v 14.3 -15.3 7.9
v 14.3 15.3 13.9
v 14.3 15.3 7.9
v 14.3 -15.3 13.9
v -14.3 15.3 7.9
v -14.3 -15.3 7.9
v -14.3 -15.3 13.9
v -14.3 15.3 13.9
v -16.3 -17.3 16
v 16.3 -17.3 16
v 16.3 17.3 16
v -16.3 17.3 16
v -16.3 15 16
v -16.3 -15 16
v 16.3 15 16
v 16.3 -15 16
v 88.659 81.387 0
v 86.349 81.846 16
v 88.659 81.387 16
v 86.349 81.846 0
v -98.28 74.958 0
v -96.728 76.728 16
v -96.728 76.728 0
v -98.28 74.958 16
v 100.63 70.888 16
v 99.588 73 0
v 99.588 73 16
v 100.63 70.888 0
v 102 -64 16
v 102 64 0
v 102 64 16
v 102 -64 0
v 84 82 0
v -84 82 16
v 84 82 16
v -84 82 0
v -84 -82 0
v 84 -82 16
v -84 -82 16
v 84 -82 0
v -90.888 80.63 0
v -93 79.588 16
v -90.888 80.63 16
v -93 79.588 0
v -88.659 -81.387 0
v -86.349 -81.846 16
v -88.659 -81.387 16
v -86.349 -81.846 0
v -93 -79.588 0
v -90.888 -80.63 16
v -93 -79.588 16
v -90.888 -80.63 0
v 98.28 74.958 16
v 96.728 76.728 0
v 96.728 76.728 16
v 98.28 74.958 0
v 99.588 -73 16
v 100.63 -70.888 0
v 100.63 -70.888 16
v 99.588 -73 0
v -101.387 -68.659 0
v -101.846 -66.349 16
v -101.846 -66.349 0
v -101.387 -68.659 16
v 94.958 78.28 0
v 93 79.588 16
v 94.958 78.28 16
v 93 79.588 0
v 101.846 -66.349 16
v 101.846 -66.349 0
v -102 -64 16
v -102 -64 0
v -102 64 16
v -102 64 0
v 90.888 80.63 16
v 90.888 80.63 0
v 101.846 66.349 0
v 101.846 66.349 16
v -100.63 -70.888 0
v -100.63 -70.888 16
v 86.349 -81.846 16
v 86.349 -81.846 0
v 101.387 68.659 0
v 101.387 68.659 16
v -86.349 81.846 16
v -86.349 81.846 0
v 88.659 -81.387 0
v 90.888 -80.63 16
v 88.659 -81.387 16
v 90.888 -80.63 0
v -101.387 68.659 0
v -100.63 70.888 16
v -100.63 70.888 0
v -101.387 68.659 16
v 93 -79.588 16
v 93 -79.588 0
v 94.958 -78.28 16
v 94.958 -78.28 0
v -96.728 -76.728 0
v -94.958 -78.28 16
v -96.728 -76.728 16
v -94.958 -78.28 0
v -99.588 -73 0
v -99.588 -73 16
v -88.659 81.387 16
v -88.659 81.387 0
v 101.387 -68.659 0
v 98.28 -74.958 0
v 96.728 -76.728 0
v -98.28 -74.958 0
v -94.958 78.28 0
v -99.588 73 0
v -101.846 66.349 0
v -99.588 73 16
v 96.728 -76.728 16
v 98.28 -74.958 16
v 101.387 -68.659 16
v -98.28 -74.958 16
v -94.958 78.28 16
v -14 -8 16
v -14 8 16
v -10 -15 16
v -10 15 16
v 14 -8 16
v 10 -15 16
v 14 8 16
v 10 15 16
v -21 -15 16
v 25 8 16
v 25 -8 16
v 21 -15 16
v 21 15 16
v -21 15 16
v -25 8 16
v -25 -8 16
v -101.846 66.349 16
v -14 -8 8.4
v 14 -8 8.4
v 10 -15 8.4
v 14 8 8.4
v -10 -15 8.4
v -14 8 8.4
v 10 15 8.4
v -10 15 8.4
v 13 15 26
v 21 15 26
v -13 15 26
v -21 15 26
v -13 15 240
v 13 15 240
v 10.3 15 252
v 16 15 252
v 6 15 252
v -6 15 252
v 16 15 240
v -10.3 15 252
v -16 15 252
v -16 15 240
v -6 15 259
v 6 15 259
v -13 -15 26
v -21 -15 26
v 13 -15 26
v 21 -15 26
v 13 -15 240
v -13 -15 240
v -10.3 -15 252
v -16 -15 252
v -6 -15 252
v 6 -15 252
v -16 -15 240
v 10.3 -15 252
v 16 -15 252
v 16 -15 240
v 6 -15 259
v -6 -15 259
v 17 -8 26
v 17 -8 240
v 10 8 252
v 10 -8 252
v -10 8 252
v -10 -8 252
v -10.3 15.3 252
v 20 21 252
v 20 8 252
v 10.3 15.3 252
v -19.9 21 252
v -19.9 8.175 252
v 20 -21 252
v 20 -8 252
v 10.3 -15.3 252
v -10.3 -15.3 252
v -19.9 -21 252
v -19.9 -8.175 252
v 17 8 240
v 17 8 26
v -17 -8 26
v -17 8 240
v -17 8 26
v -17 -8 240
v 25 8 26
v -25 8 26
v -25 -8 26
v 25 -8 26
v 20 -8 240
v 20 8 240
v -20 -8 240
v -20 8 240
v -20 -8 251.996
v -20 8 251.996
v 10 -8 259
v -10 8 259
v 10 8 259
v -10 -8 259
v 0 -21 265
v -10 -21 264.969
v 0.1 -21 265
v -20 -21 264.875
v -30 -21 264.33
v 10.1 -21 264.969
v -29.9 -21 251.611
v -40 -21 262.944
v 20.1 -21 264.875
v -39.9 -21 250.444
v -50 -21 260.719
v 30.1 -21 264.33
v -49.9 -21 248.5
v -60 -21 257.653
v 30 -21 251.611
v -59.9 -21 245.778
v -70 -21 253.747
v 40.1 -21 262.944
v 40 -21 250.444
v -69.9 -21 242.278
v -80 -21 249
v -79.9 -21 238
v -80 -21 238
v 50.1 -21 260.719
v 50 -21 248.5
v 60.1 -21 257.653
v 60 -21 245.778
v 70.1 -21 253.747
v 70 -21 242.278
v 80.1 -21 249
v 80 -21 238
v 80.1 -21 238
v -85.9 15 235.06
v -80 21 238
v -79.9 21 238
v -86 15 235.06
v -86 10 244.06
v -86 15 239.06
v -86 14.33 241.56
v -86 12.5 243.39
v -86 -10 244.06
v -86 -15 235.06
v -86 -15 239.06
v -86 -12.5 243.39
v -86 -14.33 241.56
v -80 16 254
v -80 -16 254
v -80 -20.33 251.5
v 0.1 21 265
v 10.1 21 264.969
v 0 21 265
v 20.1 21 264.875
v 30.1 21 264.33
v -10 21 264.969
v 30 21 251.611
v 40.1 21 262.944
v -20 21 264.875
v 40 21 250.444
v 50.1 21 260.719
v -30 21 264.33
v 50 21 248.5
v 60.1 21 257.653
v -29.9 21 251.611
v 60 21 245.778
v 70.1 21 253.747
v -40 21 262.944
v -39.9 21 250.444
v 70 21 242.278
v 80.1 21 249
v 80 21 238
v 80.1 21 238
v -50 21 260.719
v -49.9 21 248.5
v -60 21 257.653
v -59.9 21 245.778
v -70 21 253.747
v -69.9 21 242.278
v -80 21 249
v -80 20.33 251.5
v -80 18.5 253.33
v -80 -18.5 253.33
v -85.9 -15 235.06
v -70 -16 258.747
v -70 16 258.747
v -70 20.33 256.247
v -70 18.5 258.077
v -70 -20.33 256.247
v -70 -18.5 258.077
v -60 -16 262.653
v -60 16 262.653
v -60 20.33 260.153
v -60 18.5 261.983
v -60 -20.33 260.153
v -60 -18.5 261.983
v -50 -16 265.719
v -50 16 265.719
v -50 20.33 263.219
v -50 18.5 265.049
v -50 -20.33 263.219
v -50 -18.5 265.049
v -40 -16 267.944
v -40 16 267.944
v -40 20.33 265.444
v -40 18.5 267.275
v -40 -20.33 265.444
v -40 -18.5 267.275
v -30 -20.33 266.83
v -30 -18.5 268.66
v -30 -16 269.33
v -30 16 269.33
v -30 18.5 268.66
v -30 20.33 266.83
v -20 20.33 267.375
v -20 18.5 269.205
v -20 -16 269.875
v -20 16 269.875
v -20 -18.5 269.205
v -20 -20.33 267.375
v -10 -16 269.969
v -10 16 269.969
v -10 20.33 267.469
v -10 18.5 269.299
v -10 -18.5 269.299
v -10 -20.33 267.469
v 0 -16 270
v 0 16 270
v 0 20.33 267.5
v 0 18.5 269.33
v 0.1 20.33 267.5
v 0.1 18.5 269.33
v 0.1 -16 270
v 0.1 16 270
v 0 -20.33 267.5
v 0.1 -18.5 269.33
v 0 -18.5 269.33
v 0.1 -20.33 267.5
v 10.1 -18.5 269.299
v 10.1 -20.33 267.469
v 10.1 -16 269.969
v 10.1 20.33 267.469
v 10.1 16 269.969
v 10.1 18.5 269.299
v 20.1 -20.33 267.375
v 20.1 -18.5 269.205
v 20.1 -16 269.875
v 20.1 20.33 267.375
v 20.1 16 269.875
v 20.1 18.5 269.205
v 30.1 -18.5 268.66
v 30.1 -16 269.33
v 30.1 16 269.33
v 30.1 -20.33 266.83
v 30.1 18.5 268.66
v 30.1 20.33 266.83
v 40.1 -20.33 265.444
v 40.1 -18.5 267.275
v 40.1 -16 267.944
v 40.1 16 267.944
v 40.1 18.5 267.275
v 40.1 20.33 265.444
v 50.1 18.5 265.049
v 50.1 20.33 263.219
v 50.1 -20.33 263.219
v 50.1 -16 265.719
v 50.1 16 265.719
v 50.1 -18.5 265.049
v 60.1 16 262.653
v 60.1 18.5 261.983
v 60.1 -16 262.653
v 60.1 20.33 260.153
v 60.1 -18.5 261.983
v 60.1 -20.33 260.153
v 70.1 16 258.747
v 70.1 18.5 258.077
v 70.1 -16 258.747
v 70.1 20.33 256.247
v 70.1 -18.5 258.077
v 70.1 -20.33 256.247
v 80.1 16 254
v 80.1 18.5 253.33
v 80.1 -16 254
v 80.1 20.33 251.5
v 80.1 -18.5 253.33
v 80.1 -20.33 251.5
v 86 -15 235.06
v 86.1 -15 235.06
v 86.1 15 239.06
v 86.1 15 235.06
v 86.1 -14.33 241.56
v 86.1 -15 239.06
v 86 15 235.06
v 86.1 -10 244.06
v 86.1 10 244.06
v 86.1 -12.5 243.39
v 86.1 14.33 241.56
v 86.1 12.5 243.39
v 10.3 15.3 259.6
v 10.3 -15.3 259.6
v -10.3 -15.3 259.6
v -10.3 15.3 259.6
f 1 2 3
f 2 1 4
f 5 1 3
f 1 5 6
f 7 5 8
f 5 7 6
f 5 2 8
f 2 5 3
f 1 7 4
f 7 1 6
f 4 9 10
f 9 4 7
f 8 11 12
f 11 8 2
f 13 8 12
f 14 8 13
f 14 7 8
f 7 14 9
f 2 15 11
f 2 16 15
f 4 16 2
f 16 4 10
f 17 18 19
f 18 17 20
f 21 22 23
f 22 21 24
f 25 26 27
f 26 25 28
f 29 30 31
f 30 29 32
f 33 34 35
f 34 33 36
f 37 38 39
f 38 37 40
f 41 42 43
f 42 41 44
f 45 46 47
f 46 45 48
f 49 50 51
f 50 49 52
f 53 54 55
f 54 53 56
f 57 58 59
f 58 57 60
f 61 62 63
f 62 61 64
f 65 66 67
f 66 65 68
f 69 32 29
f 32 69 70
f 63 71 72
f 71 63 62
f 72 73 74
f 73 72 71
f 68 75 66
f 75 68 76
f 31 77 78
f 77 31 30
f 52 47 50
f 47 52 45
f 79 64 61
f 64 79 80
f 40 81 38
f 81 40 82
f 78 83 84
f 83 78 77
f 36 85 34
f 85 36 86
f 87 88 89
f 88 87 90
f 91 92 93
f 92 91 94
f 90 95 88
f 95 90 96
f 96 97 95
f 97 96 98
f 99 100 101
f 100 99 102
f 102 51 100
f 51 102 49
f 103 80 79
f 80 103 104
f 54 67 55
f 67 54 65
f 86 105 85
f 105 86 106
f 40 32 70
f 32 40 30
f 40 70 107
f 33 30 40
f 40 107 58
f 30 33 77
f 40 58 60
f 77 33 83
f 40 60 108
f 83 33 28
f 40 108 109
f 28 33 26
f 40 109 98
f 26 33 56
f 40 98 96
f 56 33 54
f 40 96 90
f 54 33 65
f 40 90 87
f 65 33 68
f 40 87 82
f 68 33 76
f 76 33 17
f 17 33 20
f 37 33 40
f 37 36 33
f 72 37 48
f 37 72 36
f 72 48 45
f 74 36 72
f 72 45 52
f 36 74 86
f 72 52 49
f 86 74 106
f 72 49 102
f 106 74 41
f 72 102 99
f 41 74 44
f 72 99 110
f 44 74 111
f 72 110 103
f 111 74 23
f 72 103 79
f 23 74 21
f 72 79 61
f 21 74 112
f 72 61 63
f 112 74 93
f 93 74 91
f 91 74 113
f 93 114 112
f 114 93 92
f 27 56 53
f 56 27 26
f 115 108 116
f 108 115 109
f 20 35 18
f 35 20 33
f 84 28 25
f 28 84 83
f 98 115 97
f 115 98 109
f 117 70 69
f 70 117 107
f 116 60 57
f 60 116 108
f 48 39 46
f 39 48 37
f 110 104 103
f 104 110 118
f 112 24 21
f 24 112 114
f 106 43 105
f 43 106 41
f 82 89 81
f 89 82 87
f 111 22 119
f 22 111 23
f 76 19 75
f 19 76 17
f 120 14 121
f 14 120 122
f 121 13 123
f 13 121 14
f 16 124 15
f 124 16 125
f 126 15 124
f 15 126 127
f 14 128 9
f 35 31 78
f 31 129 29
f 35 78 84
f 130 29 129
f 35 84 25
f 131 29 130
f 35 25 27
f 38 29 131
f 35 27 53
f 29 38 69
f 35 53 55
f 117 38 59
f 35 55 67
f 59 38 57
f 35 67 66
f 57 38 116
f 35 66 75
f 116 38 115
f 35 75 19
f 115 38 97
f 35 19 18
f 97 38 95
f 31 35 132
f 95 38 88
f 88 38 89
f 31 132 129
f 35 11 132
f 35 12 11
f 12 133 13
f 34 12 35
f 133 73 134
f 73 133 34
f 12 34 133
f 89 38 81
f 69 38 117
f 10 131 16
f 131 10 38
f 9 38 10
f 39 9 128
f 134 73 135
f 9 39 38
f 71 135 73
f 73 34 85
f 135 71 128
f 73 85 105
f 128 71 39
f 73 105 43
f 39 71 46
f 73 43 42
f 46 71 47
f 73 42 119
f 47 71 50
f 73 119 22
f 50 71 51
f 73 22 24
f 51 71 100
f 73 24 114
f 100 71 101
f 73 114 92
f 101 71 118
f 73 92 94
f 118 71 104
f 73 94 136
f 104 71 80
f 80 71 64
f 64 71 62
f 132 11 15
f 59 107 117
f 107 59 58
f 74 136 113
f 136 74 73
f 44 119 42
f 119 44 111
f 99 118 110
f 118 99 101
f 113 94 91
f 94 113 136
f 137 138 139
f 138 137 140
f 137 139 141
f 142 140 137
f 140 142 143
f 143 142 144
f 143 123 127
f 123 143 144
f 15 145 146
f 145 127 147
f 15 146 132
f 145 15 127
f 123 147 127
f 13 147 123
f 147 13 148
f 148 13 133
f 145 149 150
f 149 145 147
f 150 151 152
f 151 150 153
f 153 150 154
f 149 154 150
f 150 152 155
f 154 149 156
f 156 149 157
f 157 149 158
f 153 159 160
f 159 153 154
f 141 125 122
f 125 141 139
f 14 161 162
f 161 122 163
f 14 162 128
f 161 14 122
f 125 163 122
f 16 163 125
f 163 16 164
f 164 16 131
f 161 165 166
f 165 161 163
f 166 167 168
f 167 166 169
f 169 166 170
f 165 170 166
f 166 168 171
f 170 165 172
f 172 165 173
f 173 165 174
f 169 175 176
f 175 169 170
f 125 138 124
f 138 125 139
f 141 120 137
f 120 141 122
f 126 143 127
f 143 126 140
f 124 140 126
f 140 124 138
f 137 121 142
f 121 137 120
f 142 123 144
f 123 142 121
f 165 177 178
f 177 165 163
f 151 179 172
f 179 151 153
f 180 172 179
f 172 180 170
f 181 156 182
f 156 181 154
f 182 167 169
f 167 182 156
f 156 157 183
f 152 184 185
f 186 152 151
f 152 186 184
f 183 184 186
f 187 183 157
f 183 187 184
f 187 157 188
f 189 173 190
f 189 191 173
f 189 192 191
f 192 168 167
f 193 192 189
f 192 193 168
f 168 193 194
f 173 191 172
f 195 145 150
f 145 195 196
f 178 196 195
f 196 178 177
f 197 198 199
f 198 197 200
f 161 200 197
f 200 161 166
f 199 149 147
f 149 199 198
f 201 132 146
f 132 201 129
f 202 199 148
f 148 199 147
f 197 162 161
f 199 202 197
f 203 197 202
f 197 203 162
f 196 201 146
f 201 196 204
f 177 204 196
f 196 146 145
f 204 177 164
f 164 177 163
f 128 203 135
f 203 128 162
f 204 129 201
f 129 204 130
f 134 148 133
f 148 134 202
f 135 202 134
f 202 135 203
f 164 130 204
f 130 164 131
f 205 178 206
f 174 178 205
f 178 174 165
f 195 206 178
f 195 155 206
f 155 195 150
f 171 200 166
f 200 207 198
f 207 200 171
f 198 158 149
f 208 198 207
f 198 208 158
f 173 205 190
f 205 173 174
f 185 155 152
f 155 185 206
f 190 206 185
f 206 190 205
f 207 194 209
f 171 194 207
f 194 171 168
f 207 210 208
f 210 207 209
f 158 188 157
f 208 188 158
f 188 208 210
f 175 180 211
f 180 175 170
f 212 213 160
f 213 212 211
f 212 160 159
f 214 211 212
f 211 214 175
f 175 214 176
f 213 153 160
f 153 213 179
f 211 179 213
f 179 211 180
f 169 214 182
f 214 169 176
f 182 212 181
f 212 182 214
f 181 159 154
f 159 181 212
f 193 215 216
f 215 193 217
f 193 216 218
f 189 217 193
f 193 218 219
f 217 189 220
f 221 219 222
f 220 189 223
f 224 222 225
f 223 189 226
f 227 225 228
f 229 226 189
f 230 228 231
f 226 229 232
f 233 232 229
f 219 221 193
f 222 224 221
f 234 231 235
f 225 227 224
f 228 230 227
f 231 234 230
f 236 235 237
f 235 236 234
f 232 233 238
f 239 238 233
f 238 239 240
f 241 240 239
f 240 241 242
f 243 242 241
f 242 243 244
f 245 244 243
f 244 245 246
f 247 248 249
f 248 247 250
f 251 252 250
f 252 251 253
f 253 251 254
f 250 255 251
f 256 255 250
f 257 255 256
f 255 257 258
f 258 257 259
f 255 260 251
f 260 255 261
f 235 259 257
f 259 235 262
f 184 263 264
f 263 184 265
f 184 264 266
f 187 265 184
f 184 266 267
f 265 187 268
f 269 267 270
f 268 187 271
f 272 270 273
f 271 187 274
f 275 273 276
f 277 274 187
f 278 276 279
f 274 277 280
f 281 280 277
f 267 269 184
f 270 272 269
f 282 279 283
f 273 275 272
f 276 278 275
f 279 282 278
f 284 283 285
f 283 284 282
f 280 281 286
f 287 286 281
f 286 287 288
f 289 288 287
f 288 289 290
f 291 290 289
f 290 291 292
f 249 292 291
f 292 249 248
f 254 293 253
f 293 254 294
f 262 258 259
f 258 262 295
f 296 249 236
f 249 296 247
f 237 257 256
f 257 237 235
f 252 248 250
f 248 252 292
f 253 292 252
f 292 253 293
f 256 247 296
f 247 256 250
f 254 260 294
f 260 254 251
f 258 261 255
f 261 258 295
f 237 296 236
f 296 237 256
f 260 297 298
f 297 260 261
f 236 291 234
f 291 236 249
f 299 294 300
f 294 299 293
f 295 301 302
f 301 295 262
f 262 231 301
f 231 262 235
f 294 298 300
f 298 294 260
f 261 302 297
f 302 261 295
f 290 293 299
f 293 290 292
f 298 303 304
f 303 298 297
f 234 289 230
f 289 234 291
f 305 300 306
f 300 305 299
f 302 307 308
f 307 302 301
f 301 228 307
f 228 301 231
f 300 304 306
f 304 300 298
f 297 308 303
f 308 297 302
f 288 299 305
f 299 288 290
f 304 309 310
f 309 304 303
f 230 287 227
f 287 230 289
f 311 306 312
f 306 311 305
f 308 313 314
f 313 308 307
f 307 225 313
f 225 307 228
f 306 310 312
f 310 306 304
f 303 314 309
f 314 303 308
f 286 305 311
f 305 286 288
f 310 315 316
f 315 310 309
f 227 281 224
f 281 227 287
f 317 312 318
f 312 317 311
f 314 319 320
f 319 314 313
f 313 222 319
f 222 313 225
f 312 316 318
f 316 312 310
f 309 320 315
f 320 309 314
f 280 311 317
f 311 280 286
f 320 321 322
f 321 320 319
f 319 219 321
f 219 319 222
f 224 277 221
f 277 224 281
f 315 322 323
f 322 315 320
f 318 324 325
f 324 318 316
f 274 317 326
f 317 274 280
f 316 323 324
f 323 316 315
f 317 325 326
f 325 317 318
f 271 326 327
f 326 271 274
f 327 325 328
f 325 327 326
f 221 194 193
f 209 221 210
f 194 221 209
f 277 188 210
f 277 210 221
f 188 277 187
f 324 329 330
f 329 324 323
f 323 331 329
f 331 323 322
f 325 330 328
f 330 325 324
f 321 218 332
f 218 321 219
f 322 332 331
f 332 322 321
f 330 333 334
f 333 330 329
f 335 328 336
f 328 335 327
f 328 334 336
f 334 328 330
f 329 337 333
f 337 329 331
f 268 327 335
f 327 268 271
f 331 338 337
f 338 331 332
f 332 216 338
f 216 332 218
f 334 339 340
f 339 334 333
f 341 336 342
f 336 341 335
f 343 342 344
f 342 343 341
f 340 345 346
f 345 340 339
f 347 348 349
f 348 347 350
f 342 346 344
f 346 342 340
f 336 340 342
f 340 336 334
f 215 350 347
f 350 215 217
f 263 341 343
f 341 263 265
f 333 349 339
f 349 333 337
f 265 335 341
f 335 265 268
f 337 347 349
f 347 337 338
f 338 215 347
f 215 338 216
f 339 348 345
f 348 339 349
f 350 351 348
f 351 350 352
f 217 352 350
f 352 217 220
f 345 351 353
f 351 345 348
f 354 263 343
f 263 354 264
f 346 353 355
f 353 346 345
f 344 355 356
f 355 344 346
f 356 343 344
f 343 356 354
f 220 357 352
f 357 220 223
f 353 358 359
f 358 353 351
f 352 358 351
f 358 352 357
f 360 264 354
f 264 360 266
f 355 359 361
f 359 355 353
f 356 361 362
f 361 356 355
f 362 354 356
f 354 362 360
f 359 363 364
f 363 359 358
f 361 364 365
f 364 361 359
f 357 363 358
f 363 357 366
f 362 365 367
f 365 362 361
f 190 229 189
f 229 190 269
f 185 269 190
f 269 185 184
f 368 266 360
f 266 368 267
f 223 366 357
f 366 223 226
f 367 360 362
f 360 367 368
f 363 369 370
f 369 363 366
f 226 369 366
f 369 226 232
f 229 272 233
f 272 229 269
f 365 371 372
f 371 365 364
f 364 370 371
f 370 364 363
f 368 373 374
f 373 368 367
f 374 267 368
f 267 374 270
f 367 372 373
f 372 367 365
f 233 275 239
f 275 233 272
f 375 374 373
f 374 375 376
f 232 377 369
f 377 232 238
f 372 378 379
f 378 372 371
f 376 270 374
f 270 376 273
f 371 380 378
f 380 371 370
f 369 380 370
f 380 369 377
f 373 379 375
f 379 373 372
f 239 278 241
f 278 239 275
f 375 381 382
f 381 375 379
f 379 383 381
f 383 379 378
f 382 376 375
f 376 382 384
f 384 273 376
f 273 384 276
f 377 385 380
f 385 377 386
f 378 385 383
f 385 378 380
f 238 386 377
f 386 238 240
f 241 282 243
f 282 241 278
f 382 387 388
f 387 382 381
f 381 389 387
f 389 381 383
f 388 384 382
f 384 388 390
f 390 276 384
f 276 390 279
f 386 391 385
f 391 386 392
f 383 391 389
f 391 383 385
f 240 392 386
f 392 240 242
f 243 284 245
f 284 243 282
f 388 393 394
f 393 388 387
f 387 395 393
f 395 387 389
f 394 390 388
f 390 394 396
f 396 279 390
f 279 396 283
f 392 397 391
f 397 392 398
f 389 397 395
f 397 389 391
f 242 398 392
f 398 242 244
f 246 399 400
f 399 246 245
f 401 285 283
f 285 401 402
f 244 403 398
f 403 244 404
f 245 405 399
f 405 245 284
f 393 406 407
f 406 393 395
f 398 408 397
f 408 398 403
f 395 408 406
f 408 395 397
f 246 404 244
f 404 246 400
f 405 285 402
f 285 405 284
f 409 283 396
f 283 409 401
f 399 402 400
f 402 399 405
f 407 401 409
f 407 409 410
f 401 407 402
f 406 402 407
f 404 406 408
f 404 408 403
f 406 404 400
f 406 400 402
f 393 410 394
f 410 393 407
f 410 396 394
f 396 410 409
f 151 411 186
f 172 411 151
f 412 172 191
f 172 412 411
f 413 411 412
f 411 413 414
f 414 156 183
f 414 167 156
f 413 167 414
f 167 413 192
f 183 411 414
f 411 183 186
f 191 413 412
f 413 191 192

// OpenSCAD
// Headphone stand in three printed parts: base, post and hanger.
// No glue and no screws. Rectangular (non-round) tenons prevent rotation.
// Units: mm. Printed in PLA, 0.4 mm nozzle, no supports in the chosen
// print orientations (except for the very short flat bridge forming the
// roof of the hanger socket, which is declared in that part's spec).

part = "assembly"; // ["base", "post", "hanger", "assembly"]

$fn = 48;

/* Design parameters */
fit_clear = 0.3;          // clearance per side at both tenon joints

base_w = 204;             // left-right footprint
base_d = 164;             // front-back footprint
base_h = 16;
base_r = 18;

pocket_w = 28 + 2 * fit_clear;   // 28.6
pocket_d = 30 + 2 * fit_clear;   // 30.6
pocket_depth = 8;
pocket_floor = base_h - pocket_depth; // z = 8

post_bottom = pocket_floor + 0.4;    // end clearance in the base pocket
post_seat_z = 252;                   // post top / hanger underside
post_tip_z = 259;                    // top tenon tip
post_len_print = post_tip_z - post_bottom; // 250.6, along print X
post_body_w = 34;
post_body_d = 30;
post_flange_w = 50;
post_cap_w = 40;
lower_tenon_w = 28;
upper_tenon_w = 20;

hang_seat_z = 252;
hang_top_z = 270;
hang_len = 172;           // x = -86..86 including tapered end caps
hang_w = 42;              // y width; flat headband contact is 32 wide
hang_end_bottom = hang_seat_z - 14 * pow(66 / 60, 2); // 235.06 at |x|=86
hang_print_ymax = hang_top_z - hang_end_bottom;      // 34.94

socket_w = upper_tenon_w + 2 * fit_clear; // 20.6 in x
socket_d = post_body_d + 2 * fit_clear;   // 30.6 in y
socket_top_z = 259.6;

/* Cross-section helpers */

// Rectangle in XY with all four corners cut. lx is the cut leg along X,
// ly is the cut leg along Y. The 4/7 proportions keep the cut faces at
// about 30 degrees from vertical in the post's print orientation.
function chamfer_rect_pts(w, d, lx = 4, ly = 7) = [
  [-w/2 + lx, -d/2], [ w/2 - lx, -d/2], [ w/2, -d/2 + ly],
  [ w/2,  d/2 - ly], [ w/2 - lx,  d/2], [-w/2 + lx,  d/2],
  [-w/2,  d/2 - ly], [-w/2, -d/2 + ly]
];

module chamfer_prism(w, d, h, lx = 4, ly = 7) {
  linear_extrude(height = h)
    polygon(points = chamfer_rect_pts(w, d, lx, ly));
}

module rounded_rect_prism(w, d, r, h) {
  hull()
    for (sx = [-1, 1], sy = [-1, 1])
      translate([sx * (w/2 - r), sy * (d/2 - r), 0])
        cylinder(r = r, h = h);
}

/* ---------------- Base (assembly orientation = print orientation) */
module base_assembly() {
  difference() {
    rounded_rect_prism(base_w, base_d, base_r, base_h);
    // Blind rectangular socket for the post, with a flared mouth.
    union() {
      translate([0, 0, pocket_floor - 0.1])
        cube([pocket_w, pocket_d, base_h - pocket_floor - 1.9], center = false);
      // The cube above is centred in XY by the translate below; rebuild
      // cleanly with centred cubes:
    }
  }
}

// The base is built again here without the placeholder difference above.
// (base_assembly is not used; see base_geometry.)
module base_geometry() {
  difference() {
    rounded_rect_prism(base_w, base_d, base_r, base_h);
    union() {
      translate([0, 0, (pocket_floor + 14.1) / 2])
        cube([pocket_w, pocket_d, 14.1 - pocket_floor + 0.2], center = true);
      hull() {
        translate([0, 0, 14.0])
          cube([pocket_w, pocket_d, 0.2], center = true);
        translate([0, 0, base_h + 0.1])
          cube([pocket_w + 4, pocket_d + 4, 0.2], center = true);
      }
    }
  }
}

module base_part() {
  base_geometry();
}

/* ---------------- Post, in assembly orientation */
module post_assembly() {
  union() {
    // Lower tenon: full-depth blade, narrower in X than the body.
    translate([0, 0, post_bottom])
      chamfer_prism(lower_tenon_w, post_body_d,
                    base_h + 1 - post_bottom);
    // Main body.
    translate([0, 0, base_h])
      chamfer_prism(post_body_w, post_body_d, post_seat_z - base_h);
    // Foot flange resting on the base.
    translate([0, 0, base_h])
      chamfer_prism(post_flange_w, post_body_d, 10);
    // Capital under the hanger.
    translate([0, 0, post_seat_z - 12])
      chamfer_prism(post_cap_w, post_body_d, 12);
    // Upper tenon received by the hanger.
    translate([0, 0, post_seat_z])
      chamfer_prism(upper_tenon_w, post_body_d, post_tip_z - post_seat_z);
  }
}

// Print orientation: length along +X, the assembly -Y face on the bed.
// print: Xp = Za - post_bottom, Yp = Xa + 25, Zp = Ya + 15
module post_part() {
  multmatrix(m = [
    [0, 0, 1, -post_bottom],
    [1, 0, 0, post_flange_w/2],
    [0, 1, 0, post_body_d/2],
    [0, 0, 0, 1]
  ]) post_assembly();
}

/* ---------------- Hanger, in assembly orientation */
// Cross-section in (Y,Z), centred on the local spine. hw is half width,
// t is local vertical thickness. The headband side (top, +Z) has a 5 mm
// corner radius; the underside corners are square so the centre can seat
// flat on the post capital.
function hanger_pts(t, hw) =
  let (r = 5, tf = hw - r) [
    [-hw, -t/2], [hw, -t/2], [hw, t/2 - r],
    [tf + r * cos(30), t/2 - r + r * sin(30)],
    [tf + r * cos(60), t/2 - r + r * sin(60)],
    [tf, t/2], [-tf, t/2],
    [-tf + r * cos(120), t/2 - r + r * sin(120)],
    [-tf + r * cos(150), t/2 - r + r * sin(150)],
    [-hw, t/2 - r]
  ];

function hang_bottom(x) =
  let (ax = abs(x))
    ax <= 20 ? hang_seat_z
             : hang_seat_z - 14 * pow((ax - 20) / 60, 2);

function hang_thick(x) = 18 - 2 * pow(abs(x) / 80, 2);

// [centre z, thickness, half width] at station x
function hang_station(x) =
  abs(x) <= 80
    ? [hang_bottom(x) + hang_thick(x) / 2,
       hang_thick(x), hang_w / 2]
    : [(hang_end_bottom + 9 / 2), 9, 15];

hang_xs = concat([-86], [for (i = [-8 : 8]) i * 10], [86]);

module hang_section(x) {
  s = hang_station(x);
  // Local polygon axes: X = assembly Y, Y = assembly Z (relative).
  // Slice thickness is local Z, mapped to assembly X.
  multmatrix(m = [
    [0, 0, 1, x],
    [1, 0, 0, 0],
    [0, 1, 0, s[0]],
    [0, 0, 0, 1]
  ])
    linear_extrude(height = 0.1)
      polygon(points = hanger_pts(s[1], s[2]));
}

module hanger_assembly() {
  difference() {
    union()
      for (i = [0 : len(hang_xs) - 2])
        hull() {
          hang_section(hang_xs[i]);
          hang_section(hang_xs[i + 1]);
        }
    // Blind socket in the underside, over the post's upper tenon.
    translate([0, 0, (hang_seat_z - 1 + socket_top_z) / 2])
      cube([socket_w, socket_d, socket_top_z - hang_seat_z + 1],
           center = true);
  }
}

// Print orientation: on one 42 mm side face. Xp = Xa,
// Yp = hang_top_z - Za, Zp = Ya + hang_w/2. Bed is Zp = 0.
module hanger_part() {
  multmatrix(m = [
    [1, 0, 0, 0],
    [0, 0, -1, hang_top_z],
    [0, 1, 0, hang_w/2],
    [0, 0, 0, 1]
  ]) hanger_assembly();
}

/* ---------------- Specs and part selection */

if (part == "base") {
  echo(cadverify_spec = [
    ["bounds", [[-base_w/2, -base_d/2, 0], [base_w/2, base_d/2, base_h]]],
    ["bodies", 1],
    ["through_holes", 0],
    ["support_faces", [["desk", "-z", 30000]]],
    ["overhangs_allowed", []],
    ["copies", 1],
    ["details", [
      ["plinth", "material", [[-90, -70, 1], [90, 70, 7]], 0.95],
      ["socket", "void", [[-13, -14, 9], [13, 14, 15]], 0.95],
      ["socket_floor", "thickness", [0, 0, 25], [0, 0, -1], pocket_floor],
      ["base_outline", "view", [[-base_w/2, -base_d/2, 0], [base_w/2, -60, base_h]]]
    ]]
  ]);
  base_part();
} else if (part == "post") {
  echo(cadverify_spec = [
    ["bounds", [[0, 0, 0], [post_len_print, post_flange_w, post_body_d]]],
    ["bodies", 1],
    ["through_holes", 0],
    ["support_faces", [["bed", "-z", 6000]]],
    ["overhangs_allowed", []],
    ["copies", 1],
    ["details", [
      ["lower_tenon", "material", [[0, 12, 1], [8, 38, 29]], 0.90],
      ["foot_flange", "material", [[8, 2, 8], [18, 48, 22]], 0.95],
      ["body_thickness", "thickness", [100, post_flange_w/2, -5], [0, 0, 1], post_body_d],
      ["upper_tenon", "material", [[244, 16, 1], [post_len_print, 34, 29]], 0.90],
      ["upper_tenon_end", "view", [[240, 10, 0], [post_len_print, 40, post_body_d]]]
    ]]
  ]);
  post_part();
} else if (part == "hanger") {
  echo(cadverify_spec = [
    ["bounds", [[-hang_len/2, 0, 0], [hang_len/2, hang_print_ymax, hang_w]]],
    ["bodies", 1],
    ["through_holes", 0],
    ["support_faces", [["bed", "-z", 1900]]],
    ["overhangs_allowed", [
      ["roof of the blind hanger socket is a flat bridge of about 8 mm in the print-Y direction and prints support-free in PLA",
        [[-11, 10, 34], [11, 19, 37]]]
    ]],
    ["copies", 1],
    ["details", [
      ["socket", "void", [[-9, 11, 7], [9, 18, 35]], 0.95],
      ["saddle_flat", "material", [[-20, 1, 5], [20, 4, 37]], 0.90],
      ["saddle_profile_thickness", "thickness", [30, -5, hang_w/2], [0, 1, 0], 17.72],
      ["hanger_width", "thickness", [30, 10, -5], [0, 0, 1], hang_w],
      ["saddle_curve", "view", [[-hang_len/2, 0, 5], [hang_len/2, 12, 37]]]
    ]]
  ]);
  hanger_part();
} else if (part == "assembly") {
  echo(cadverify_spec = [
    ["bounds", [[-base_w/2, -base_d/2, 0], [base_w/2, base_d/2, hang_top_z]]],
    ["support_faces", [["desk", "-z", 30000]]],
    ["allowed_interferences", []],
    ["assembly_order", [
      [["base"], [0, 0, 0]],
      [["post"], [0, 0, -1]],
      [["hanger"], [0, 0, -1]]
    ]]
  ]);

  cadverify_only = "";
  // Instances are declared at the end of this branch (see below).
  assembly_instances();
}

module assembly_instances() {
  instance("base", "base")
    base_part();

  // Inverse of the post print transform:
  // Xa = Yp - 25, Ya = Zp - 15, Za = Xp + post_bottom
  instance("post", "post")
    multmatrix(m = [
      [0, 1, 0, -post_flange_w/2],
      [0, 0, 1, -post_body_d/2],
      [1, 0, 0, post_bottom],
      [0, 0, 0, 1]
    ]) post_part();

  // Inverse of the hanger print transform:
  // Xa = Xp, Ya = Zp - 21, Za = hang_top_z - Yp
  instance("hanger", "hanger")
    multmatrix(m = [
      [1, 0, 0, 0],
      [0, 0, 1, -hang_w/2],
      [0, -1, 0, hang_top_z],
      [0, 0, 0, 1]
    ]) hanger_part();
}

cadverify_only = "";
module instance(name, part_name, unit = 1) {
  echo(cadverify_instance = [name, part_name, unit]);
  if (cadverify_only == "" || cadverify_only == name) children();
}
